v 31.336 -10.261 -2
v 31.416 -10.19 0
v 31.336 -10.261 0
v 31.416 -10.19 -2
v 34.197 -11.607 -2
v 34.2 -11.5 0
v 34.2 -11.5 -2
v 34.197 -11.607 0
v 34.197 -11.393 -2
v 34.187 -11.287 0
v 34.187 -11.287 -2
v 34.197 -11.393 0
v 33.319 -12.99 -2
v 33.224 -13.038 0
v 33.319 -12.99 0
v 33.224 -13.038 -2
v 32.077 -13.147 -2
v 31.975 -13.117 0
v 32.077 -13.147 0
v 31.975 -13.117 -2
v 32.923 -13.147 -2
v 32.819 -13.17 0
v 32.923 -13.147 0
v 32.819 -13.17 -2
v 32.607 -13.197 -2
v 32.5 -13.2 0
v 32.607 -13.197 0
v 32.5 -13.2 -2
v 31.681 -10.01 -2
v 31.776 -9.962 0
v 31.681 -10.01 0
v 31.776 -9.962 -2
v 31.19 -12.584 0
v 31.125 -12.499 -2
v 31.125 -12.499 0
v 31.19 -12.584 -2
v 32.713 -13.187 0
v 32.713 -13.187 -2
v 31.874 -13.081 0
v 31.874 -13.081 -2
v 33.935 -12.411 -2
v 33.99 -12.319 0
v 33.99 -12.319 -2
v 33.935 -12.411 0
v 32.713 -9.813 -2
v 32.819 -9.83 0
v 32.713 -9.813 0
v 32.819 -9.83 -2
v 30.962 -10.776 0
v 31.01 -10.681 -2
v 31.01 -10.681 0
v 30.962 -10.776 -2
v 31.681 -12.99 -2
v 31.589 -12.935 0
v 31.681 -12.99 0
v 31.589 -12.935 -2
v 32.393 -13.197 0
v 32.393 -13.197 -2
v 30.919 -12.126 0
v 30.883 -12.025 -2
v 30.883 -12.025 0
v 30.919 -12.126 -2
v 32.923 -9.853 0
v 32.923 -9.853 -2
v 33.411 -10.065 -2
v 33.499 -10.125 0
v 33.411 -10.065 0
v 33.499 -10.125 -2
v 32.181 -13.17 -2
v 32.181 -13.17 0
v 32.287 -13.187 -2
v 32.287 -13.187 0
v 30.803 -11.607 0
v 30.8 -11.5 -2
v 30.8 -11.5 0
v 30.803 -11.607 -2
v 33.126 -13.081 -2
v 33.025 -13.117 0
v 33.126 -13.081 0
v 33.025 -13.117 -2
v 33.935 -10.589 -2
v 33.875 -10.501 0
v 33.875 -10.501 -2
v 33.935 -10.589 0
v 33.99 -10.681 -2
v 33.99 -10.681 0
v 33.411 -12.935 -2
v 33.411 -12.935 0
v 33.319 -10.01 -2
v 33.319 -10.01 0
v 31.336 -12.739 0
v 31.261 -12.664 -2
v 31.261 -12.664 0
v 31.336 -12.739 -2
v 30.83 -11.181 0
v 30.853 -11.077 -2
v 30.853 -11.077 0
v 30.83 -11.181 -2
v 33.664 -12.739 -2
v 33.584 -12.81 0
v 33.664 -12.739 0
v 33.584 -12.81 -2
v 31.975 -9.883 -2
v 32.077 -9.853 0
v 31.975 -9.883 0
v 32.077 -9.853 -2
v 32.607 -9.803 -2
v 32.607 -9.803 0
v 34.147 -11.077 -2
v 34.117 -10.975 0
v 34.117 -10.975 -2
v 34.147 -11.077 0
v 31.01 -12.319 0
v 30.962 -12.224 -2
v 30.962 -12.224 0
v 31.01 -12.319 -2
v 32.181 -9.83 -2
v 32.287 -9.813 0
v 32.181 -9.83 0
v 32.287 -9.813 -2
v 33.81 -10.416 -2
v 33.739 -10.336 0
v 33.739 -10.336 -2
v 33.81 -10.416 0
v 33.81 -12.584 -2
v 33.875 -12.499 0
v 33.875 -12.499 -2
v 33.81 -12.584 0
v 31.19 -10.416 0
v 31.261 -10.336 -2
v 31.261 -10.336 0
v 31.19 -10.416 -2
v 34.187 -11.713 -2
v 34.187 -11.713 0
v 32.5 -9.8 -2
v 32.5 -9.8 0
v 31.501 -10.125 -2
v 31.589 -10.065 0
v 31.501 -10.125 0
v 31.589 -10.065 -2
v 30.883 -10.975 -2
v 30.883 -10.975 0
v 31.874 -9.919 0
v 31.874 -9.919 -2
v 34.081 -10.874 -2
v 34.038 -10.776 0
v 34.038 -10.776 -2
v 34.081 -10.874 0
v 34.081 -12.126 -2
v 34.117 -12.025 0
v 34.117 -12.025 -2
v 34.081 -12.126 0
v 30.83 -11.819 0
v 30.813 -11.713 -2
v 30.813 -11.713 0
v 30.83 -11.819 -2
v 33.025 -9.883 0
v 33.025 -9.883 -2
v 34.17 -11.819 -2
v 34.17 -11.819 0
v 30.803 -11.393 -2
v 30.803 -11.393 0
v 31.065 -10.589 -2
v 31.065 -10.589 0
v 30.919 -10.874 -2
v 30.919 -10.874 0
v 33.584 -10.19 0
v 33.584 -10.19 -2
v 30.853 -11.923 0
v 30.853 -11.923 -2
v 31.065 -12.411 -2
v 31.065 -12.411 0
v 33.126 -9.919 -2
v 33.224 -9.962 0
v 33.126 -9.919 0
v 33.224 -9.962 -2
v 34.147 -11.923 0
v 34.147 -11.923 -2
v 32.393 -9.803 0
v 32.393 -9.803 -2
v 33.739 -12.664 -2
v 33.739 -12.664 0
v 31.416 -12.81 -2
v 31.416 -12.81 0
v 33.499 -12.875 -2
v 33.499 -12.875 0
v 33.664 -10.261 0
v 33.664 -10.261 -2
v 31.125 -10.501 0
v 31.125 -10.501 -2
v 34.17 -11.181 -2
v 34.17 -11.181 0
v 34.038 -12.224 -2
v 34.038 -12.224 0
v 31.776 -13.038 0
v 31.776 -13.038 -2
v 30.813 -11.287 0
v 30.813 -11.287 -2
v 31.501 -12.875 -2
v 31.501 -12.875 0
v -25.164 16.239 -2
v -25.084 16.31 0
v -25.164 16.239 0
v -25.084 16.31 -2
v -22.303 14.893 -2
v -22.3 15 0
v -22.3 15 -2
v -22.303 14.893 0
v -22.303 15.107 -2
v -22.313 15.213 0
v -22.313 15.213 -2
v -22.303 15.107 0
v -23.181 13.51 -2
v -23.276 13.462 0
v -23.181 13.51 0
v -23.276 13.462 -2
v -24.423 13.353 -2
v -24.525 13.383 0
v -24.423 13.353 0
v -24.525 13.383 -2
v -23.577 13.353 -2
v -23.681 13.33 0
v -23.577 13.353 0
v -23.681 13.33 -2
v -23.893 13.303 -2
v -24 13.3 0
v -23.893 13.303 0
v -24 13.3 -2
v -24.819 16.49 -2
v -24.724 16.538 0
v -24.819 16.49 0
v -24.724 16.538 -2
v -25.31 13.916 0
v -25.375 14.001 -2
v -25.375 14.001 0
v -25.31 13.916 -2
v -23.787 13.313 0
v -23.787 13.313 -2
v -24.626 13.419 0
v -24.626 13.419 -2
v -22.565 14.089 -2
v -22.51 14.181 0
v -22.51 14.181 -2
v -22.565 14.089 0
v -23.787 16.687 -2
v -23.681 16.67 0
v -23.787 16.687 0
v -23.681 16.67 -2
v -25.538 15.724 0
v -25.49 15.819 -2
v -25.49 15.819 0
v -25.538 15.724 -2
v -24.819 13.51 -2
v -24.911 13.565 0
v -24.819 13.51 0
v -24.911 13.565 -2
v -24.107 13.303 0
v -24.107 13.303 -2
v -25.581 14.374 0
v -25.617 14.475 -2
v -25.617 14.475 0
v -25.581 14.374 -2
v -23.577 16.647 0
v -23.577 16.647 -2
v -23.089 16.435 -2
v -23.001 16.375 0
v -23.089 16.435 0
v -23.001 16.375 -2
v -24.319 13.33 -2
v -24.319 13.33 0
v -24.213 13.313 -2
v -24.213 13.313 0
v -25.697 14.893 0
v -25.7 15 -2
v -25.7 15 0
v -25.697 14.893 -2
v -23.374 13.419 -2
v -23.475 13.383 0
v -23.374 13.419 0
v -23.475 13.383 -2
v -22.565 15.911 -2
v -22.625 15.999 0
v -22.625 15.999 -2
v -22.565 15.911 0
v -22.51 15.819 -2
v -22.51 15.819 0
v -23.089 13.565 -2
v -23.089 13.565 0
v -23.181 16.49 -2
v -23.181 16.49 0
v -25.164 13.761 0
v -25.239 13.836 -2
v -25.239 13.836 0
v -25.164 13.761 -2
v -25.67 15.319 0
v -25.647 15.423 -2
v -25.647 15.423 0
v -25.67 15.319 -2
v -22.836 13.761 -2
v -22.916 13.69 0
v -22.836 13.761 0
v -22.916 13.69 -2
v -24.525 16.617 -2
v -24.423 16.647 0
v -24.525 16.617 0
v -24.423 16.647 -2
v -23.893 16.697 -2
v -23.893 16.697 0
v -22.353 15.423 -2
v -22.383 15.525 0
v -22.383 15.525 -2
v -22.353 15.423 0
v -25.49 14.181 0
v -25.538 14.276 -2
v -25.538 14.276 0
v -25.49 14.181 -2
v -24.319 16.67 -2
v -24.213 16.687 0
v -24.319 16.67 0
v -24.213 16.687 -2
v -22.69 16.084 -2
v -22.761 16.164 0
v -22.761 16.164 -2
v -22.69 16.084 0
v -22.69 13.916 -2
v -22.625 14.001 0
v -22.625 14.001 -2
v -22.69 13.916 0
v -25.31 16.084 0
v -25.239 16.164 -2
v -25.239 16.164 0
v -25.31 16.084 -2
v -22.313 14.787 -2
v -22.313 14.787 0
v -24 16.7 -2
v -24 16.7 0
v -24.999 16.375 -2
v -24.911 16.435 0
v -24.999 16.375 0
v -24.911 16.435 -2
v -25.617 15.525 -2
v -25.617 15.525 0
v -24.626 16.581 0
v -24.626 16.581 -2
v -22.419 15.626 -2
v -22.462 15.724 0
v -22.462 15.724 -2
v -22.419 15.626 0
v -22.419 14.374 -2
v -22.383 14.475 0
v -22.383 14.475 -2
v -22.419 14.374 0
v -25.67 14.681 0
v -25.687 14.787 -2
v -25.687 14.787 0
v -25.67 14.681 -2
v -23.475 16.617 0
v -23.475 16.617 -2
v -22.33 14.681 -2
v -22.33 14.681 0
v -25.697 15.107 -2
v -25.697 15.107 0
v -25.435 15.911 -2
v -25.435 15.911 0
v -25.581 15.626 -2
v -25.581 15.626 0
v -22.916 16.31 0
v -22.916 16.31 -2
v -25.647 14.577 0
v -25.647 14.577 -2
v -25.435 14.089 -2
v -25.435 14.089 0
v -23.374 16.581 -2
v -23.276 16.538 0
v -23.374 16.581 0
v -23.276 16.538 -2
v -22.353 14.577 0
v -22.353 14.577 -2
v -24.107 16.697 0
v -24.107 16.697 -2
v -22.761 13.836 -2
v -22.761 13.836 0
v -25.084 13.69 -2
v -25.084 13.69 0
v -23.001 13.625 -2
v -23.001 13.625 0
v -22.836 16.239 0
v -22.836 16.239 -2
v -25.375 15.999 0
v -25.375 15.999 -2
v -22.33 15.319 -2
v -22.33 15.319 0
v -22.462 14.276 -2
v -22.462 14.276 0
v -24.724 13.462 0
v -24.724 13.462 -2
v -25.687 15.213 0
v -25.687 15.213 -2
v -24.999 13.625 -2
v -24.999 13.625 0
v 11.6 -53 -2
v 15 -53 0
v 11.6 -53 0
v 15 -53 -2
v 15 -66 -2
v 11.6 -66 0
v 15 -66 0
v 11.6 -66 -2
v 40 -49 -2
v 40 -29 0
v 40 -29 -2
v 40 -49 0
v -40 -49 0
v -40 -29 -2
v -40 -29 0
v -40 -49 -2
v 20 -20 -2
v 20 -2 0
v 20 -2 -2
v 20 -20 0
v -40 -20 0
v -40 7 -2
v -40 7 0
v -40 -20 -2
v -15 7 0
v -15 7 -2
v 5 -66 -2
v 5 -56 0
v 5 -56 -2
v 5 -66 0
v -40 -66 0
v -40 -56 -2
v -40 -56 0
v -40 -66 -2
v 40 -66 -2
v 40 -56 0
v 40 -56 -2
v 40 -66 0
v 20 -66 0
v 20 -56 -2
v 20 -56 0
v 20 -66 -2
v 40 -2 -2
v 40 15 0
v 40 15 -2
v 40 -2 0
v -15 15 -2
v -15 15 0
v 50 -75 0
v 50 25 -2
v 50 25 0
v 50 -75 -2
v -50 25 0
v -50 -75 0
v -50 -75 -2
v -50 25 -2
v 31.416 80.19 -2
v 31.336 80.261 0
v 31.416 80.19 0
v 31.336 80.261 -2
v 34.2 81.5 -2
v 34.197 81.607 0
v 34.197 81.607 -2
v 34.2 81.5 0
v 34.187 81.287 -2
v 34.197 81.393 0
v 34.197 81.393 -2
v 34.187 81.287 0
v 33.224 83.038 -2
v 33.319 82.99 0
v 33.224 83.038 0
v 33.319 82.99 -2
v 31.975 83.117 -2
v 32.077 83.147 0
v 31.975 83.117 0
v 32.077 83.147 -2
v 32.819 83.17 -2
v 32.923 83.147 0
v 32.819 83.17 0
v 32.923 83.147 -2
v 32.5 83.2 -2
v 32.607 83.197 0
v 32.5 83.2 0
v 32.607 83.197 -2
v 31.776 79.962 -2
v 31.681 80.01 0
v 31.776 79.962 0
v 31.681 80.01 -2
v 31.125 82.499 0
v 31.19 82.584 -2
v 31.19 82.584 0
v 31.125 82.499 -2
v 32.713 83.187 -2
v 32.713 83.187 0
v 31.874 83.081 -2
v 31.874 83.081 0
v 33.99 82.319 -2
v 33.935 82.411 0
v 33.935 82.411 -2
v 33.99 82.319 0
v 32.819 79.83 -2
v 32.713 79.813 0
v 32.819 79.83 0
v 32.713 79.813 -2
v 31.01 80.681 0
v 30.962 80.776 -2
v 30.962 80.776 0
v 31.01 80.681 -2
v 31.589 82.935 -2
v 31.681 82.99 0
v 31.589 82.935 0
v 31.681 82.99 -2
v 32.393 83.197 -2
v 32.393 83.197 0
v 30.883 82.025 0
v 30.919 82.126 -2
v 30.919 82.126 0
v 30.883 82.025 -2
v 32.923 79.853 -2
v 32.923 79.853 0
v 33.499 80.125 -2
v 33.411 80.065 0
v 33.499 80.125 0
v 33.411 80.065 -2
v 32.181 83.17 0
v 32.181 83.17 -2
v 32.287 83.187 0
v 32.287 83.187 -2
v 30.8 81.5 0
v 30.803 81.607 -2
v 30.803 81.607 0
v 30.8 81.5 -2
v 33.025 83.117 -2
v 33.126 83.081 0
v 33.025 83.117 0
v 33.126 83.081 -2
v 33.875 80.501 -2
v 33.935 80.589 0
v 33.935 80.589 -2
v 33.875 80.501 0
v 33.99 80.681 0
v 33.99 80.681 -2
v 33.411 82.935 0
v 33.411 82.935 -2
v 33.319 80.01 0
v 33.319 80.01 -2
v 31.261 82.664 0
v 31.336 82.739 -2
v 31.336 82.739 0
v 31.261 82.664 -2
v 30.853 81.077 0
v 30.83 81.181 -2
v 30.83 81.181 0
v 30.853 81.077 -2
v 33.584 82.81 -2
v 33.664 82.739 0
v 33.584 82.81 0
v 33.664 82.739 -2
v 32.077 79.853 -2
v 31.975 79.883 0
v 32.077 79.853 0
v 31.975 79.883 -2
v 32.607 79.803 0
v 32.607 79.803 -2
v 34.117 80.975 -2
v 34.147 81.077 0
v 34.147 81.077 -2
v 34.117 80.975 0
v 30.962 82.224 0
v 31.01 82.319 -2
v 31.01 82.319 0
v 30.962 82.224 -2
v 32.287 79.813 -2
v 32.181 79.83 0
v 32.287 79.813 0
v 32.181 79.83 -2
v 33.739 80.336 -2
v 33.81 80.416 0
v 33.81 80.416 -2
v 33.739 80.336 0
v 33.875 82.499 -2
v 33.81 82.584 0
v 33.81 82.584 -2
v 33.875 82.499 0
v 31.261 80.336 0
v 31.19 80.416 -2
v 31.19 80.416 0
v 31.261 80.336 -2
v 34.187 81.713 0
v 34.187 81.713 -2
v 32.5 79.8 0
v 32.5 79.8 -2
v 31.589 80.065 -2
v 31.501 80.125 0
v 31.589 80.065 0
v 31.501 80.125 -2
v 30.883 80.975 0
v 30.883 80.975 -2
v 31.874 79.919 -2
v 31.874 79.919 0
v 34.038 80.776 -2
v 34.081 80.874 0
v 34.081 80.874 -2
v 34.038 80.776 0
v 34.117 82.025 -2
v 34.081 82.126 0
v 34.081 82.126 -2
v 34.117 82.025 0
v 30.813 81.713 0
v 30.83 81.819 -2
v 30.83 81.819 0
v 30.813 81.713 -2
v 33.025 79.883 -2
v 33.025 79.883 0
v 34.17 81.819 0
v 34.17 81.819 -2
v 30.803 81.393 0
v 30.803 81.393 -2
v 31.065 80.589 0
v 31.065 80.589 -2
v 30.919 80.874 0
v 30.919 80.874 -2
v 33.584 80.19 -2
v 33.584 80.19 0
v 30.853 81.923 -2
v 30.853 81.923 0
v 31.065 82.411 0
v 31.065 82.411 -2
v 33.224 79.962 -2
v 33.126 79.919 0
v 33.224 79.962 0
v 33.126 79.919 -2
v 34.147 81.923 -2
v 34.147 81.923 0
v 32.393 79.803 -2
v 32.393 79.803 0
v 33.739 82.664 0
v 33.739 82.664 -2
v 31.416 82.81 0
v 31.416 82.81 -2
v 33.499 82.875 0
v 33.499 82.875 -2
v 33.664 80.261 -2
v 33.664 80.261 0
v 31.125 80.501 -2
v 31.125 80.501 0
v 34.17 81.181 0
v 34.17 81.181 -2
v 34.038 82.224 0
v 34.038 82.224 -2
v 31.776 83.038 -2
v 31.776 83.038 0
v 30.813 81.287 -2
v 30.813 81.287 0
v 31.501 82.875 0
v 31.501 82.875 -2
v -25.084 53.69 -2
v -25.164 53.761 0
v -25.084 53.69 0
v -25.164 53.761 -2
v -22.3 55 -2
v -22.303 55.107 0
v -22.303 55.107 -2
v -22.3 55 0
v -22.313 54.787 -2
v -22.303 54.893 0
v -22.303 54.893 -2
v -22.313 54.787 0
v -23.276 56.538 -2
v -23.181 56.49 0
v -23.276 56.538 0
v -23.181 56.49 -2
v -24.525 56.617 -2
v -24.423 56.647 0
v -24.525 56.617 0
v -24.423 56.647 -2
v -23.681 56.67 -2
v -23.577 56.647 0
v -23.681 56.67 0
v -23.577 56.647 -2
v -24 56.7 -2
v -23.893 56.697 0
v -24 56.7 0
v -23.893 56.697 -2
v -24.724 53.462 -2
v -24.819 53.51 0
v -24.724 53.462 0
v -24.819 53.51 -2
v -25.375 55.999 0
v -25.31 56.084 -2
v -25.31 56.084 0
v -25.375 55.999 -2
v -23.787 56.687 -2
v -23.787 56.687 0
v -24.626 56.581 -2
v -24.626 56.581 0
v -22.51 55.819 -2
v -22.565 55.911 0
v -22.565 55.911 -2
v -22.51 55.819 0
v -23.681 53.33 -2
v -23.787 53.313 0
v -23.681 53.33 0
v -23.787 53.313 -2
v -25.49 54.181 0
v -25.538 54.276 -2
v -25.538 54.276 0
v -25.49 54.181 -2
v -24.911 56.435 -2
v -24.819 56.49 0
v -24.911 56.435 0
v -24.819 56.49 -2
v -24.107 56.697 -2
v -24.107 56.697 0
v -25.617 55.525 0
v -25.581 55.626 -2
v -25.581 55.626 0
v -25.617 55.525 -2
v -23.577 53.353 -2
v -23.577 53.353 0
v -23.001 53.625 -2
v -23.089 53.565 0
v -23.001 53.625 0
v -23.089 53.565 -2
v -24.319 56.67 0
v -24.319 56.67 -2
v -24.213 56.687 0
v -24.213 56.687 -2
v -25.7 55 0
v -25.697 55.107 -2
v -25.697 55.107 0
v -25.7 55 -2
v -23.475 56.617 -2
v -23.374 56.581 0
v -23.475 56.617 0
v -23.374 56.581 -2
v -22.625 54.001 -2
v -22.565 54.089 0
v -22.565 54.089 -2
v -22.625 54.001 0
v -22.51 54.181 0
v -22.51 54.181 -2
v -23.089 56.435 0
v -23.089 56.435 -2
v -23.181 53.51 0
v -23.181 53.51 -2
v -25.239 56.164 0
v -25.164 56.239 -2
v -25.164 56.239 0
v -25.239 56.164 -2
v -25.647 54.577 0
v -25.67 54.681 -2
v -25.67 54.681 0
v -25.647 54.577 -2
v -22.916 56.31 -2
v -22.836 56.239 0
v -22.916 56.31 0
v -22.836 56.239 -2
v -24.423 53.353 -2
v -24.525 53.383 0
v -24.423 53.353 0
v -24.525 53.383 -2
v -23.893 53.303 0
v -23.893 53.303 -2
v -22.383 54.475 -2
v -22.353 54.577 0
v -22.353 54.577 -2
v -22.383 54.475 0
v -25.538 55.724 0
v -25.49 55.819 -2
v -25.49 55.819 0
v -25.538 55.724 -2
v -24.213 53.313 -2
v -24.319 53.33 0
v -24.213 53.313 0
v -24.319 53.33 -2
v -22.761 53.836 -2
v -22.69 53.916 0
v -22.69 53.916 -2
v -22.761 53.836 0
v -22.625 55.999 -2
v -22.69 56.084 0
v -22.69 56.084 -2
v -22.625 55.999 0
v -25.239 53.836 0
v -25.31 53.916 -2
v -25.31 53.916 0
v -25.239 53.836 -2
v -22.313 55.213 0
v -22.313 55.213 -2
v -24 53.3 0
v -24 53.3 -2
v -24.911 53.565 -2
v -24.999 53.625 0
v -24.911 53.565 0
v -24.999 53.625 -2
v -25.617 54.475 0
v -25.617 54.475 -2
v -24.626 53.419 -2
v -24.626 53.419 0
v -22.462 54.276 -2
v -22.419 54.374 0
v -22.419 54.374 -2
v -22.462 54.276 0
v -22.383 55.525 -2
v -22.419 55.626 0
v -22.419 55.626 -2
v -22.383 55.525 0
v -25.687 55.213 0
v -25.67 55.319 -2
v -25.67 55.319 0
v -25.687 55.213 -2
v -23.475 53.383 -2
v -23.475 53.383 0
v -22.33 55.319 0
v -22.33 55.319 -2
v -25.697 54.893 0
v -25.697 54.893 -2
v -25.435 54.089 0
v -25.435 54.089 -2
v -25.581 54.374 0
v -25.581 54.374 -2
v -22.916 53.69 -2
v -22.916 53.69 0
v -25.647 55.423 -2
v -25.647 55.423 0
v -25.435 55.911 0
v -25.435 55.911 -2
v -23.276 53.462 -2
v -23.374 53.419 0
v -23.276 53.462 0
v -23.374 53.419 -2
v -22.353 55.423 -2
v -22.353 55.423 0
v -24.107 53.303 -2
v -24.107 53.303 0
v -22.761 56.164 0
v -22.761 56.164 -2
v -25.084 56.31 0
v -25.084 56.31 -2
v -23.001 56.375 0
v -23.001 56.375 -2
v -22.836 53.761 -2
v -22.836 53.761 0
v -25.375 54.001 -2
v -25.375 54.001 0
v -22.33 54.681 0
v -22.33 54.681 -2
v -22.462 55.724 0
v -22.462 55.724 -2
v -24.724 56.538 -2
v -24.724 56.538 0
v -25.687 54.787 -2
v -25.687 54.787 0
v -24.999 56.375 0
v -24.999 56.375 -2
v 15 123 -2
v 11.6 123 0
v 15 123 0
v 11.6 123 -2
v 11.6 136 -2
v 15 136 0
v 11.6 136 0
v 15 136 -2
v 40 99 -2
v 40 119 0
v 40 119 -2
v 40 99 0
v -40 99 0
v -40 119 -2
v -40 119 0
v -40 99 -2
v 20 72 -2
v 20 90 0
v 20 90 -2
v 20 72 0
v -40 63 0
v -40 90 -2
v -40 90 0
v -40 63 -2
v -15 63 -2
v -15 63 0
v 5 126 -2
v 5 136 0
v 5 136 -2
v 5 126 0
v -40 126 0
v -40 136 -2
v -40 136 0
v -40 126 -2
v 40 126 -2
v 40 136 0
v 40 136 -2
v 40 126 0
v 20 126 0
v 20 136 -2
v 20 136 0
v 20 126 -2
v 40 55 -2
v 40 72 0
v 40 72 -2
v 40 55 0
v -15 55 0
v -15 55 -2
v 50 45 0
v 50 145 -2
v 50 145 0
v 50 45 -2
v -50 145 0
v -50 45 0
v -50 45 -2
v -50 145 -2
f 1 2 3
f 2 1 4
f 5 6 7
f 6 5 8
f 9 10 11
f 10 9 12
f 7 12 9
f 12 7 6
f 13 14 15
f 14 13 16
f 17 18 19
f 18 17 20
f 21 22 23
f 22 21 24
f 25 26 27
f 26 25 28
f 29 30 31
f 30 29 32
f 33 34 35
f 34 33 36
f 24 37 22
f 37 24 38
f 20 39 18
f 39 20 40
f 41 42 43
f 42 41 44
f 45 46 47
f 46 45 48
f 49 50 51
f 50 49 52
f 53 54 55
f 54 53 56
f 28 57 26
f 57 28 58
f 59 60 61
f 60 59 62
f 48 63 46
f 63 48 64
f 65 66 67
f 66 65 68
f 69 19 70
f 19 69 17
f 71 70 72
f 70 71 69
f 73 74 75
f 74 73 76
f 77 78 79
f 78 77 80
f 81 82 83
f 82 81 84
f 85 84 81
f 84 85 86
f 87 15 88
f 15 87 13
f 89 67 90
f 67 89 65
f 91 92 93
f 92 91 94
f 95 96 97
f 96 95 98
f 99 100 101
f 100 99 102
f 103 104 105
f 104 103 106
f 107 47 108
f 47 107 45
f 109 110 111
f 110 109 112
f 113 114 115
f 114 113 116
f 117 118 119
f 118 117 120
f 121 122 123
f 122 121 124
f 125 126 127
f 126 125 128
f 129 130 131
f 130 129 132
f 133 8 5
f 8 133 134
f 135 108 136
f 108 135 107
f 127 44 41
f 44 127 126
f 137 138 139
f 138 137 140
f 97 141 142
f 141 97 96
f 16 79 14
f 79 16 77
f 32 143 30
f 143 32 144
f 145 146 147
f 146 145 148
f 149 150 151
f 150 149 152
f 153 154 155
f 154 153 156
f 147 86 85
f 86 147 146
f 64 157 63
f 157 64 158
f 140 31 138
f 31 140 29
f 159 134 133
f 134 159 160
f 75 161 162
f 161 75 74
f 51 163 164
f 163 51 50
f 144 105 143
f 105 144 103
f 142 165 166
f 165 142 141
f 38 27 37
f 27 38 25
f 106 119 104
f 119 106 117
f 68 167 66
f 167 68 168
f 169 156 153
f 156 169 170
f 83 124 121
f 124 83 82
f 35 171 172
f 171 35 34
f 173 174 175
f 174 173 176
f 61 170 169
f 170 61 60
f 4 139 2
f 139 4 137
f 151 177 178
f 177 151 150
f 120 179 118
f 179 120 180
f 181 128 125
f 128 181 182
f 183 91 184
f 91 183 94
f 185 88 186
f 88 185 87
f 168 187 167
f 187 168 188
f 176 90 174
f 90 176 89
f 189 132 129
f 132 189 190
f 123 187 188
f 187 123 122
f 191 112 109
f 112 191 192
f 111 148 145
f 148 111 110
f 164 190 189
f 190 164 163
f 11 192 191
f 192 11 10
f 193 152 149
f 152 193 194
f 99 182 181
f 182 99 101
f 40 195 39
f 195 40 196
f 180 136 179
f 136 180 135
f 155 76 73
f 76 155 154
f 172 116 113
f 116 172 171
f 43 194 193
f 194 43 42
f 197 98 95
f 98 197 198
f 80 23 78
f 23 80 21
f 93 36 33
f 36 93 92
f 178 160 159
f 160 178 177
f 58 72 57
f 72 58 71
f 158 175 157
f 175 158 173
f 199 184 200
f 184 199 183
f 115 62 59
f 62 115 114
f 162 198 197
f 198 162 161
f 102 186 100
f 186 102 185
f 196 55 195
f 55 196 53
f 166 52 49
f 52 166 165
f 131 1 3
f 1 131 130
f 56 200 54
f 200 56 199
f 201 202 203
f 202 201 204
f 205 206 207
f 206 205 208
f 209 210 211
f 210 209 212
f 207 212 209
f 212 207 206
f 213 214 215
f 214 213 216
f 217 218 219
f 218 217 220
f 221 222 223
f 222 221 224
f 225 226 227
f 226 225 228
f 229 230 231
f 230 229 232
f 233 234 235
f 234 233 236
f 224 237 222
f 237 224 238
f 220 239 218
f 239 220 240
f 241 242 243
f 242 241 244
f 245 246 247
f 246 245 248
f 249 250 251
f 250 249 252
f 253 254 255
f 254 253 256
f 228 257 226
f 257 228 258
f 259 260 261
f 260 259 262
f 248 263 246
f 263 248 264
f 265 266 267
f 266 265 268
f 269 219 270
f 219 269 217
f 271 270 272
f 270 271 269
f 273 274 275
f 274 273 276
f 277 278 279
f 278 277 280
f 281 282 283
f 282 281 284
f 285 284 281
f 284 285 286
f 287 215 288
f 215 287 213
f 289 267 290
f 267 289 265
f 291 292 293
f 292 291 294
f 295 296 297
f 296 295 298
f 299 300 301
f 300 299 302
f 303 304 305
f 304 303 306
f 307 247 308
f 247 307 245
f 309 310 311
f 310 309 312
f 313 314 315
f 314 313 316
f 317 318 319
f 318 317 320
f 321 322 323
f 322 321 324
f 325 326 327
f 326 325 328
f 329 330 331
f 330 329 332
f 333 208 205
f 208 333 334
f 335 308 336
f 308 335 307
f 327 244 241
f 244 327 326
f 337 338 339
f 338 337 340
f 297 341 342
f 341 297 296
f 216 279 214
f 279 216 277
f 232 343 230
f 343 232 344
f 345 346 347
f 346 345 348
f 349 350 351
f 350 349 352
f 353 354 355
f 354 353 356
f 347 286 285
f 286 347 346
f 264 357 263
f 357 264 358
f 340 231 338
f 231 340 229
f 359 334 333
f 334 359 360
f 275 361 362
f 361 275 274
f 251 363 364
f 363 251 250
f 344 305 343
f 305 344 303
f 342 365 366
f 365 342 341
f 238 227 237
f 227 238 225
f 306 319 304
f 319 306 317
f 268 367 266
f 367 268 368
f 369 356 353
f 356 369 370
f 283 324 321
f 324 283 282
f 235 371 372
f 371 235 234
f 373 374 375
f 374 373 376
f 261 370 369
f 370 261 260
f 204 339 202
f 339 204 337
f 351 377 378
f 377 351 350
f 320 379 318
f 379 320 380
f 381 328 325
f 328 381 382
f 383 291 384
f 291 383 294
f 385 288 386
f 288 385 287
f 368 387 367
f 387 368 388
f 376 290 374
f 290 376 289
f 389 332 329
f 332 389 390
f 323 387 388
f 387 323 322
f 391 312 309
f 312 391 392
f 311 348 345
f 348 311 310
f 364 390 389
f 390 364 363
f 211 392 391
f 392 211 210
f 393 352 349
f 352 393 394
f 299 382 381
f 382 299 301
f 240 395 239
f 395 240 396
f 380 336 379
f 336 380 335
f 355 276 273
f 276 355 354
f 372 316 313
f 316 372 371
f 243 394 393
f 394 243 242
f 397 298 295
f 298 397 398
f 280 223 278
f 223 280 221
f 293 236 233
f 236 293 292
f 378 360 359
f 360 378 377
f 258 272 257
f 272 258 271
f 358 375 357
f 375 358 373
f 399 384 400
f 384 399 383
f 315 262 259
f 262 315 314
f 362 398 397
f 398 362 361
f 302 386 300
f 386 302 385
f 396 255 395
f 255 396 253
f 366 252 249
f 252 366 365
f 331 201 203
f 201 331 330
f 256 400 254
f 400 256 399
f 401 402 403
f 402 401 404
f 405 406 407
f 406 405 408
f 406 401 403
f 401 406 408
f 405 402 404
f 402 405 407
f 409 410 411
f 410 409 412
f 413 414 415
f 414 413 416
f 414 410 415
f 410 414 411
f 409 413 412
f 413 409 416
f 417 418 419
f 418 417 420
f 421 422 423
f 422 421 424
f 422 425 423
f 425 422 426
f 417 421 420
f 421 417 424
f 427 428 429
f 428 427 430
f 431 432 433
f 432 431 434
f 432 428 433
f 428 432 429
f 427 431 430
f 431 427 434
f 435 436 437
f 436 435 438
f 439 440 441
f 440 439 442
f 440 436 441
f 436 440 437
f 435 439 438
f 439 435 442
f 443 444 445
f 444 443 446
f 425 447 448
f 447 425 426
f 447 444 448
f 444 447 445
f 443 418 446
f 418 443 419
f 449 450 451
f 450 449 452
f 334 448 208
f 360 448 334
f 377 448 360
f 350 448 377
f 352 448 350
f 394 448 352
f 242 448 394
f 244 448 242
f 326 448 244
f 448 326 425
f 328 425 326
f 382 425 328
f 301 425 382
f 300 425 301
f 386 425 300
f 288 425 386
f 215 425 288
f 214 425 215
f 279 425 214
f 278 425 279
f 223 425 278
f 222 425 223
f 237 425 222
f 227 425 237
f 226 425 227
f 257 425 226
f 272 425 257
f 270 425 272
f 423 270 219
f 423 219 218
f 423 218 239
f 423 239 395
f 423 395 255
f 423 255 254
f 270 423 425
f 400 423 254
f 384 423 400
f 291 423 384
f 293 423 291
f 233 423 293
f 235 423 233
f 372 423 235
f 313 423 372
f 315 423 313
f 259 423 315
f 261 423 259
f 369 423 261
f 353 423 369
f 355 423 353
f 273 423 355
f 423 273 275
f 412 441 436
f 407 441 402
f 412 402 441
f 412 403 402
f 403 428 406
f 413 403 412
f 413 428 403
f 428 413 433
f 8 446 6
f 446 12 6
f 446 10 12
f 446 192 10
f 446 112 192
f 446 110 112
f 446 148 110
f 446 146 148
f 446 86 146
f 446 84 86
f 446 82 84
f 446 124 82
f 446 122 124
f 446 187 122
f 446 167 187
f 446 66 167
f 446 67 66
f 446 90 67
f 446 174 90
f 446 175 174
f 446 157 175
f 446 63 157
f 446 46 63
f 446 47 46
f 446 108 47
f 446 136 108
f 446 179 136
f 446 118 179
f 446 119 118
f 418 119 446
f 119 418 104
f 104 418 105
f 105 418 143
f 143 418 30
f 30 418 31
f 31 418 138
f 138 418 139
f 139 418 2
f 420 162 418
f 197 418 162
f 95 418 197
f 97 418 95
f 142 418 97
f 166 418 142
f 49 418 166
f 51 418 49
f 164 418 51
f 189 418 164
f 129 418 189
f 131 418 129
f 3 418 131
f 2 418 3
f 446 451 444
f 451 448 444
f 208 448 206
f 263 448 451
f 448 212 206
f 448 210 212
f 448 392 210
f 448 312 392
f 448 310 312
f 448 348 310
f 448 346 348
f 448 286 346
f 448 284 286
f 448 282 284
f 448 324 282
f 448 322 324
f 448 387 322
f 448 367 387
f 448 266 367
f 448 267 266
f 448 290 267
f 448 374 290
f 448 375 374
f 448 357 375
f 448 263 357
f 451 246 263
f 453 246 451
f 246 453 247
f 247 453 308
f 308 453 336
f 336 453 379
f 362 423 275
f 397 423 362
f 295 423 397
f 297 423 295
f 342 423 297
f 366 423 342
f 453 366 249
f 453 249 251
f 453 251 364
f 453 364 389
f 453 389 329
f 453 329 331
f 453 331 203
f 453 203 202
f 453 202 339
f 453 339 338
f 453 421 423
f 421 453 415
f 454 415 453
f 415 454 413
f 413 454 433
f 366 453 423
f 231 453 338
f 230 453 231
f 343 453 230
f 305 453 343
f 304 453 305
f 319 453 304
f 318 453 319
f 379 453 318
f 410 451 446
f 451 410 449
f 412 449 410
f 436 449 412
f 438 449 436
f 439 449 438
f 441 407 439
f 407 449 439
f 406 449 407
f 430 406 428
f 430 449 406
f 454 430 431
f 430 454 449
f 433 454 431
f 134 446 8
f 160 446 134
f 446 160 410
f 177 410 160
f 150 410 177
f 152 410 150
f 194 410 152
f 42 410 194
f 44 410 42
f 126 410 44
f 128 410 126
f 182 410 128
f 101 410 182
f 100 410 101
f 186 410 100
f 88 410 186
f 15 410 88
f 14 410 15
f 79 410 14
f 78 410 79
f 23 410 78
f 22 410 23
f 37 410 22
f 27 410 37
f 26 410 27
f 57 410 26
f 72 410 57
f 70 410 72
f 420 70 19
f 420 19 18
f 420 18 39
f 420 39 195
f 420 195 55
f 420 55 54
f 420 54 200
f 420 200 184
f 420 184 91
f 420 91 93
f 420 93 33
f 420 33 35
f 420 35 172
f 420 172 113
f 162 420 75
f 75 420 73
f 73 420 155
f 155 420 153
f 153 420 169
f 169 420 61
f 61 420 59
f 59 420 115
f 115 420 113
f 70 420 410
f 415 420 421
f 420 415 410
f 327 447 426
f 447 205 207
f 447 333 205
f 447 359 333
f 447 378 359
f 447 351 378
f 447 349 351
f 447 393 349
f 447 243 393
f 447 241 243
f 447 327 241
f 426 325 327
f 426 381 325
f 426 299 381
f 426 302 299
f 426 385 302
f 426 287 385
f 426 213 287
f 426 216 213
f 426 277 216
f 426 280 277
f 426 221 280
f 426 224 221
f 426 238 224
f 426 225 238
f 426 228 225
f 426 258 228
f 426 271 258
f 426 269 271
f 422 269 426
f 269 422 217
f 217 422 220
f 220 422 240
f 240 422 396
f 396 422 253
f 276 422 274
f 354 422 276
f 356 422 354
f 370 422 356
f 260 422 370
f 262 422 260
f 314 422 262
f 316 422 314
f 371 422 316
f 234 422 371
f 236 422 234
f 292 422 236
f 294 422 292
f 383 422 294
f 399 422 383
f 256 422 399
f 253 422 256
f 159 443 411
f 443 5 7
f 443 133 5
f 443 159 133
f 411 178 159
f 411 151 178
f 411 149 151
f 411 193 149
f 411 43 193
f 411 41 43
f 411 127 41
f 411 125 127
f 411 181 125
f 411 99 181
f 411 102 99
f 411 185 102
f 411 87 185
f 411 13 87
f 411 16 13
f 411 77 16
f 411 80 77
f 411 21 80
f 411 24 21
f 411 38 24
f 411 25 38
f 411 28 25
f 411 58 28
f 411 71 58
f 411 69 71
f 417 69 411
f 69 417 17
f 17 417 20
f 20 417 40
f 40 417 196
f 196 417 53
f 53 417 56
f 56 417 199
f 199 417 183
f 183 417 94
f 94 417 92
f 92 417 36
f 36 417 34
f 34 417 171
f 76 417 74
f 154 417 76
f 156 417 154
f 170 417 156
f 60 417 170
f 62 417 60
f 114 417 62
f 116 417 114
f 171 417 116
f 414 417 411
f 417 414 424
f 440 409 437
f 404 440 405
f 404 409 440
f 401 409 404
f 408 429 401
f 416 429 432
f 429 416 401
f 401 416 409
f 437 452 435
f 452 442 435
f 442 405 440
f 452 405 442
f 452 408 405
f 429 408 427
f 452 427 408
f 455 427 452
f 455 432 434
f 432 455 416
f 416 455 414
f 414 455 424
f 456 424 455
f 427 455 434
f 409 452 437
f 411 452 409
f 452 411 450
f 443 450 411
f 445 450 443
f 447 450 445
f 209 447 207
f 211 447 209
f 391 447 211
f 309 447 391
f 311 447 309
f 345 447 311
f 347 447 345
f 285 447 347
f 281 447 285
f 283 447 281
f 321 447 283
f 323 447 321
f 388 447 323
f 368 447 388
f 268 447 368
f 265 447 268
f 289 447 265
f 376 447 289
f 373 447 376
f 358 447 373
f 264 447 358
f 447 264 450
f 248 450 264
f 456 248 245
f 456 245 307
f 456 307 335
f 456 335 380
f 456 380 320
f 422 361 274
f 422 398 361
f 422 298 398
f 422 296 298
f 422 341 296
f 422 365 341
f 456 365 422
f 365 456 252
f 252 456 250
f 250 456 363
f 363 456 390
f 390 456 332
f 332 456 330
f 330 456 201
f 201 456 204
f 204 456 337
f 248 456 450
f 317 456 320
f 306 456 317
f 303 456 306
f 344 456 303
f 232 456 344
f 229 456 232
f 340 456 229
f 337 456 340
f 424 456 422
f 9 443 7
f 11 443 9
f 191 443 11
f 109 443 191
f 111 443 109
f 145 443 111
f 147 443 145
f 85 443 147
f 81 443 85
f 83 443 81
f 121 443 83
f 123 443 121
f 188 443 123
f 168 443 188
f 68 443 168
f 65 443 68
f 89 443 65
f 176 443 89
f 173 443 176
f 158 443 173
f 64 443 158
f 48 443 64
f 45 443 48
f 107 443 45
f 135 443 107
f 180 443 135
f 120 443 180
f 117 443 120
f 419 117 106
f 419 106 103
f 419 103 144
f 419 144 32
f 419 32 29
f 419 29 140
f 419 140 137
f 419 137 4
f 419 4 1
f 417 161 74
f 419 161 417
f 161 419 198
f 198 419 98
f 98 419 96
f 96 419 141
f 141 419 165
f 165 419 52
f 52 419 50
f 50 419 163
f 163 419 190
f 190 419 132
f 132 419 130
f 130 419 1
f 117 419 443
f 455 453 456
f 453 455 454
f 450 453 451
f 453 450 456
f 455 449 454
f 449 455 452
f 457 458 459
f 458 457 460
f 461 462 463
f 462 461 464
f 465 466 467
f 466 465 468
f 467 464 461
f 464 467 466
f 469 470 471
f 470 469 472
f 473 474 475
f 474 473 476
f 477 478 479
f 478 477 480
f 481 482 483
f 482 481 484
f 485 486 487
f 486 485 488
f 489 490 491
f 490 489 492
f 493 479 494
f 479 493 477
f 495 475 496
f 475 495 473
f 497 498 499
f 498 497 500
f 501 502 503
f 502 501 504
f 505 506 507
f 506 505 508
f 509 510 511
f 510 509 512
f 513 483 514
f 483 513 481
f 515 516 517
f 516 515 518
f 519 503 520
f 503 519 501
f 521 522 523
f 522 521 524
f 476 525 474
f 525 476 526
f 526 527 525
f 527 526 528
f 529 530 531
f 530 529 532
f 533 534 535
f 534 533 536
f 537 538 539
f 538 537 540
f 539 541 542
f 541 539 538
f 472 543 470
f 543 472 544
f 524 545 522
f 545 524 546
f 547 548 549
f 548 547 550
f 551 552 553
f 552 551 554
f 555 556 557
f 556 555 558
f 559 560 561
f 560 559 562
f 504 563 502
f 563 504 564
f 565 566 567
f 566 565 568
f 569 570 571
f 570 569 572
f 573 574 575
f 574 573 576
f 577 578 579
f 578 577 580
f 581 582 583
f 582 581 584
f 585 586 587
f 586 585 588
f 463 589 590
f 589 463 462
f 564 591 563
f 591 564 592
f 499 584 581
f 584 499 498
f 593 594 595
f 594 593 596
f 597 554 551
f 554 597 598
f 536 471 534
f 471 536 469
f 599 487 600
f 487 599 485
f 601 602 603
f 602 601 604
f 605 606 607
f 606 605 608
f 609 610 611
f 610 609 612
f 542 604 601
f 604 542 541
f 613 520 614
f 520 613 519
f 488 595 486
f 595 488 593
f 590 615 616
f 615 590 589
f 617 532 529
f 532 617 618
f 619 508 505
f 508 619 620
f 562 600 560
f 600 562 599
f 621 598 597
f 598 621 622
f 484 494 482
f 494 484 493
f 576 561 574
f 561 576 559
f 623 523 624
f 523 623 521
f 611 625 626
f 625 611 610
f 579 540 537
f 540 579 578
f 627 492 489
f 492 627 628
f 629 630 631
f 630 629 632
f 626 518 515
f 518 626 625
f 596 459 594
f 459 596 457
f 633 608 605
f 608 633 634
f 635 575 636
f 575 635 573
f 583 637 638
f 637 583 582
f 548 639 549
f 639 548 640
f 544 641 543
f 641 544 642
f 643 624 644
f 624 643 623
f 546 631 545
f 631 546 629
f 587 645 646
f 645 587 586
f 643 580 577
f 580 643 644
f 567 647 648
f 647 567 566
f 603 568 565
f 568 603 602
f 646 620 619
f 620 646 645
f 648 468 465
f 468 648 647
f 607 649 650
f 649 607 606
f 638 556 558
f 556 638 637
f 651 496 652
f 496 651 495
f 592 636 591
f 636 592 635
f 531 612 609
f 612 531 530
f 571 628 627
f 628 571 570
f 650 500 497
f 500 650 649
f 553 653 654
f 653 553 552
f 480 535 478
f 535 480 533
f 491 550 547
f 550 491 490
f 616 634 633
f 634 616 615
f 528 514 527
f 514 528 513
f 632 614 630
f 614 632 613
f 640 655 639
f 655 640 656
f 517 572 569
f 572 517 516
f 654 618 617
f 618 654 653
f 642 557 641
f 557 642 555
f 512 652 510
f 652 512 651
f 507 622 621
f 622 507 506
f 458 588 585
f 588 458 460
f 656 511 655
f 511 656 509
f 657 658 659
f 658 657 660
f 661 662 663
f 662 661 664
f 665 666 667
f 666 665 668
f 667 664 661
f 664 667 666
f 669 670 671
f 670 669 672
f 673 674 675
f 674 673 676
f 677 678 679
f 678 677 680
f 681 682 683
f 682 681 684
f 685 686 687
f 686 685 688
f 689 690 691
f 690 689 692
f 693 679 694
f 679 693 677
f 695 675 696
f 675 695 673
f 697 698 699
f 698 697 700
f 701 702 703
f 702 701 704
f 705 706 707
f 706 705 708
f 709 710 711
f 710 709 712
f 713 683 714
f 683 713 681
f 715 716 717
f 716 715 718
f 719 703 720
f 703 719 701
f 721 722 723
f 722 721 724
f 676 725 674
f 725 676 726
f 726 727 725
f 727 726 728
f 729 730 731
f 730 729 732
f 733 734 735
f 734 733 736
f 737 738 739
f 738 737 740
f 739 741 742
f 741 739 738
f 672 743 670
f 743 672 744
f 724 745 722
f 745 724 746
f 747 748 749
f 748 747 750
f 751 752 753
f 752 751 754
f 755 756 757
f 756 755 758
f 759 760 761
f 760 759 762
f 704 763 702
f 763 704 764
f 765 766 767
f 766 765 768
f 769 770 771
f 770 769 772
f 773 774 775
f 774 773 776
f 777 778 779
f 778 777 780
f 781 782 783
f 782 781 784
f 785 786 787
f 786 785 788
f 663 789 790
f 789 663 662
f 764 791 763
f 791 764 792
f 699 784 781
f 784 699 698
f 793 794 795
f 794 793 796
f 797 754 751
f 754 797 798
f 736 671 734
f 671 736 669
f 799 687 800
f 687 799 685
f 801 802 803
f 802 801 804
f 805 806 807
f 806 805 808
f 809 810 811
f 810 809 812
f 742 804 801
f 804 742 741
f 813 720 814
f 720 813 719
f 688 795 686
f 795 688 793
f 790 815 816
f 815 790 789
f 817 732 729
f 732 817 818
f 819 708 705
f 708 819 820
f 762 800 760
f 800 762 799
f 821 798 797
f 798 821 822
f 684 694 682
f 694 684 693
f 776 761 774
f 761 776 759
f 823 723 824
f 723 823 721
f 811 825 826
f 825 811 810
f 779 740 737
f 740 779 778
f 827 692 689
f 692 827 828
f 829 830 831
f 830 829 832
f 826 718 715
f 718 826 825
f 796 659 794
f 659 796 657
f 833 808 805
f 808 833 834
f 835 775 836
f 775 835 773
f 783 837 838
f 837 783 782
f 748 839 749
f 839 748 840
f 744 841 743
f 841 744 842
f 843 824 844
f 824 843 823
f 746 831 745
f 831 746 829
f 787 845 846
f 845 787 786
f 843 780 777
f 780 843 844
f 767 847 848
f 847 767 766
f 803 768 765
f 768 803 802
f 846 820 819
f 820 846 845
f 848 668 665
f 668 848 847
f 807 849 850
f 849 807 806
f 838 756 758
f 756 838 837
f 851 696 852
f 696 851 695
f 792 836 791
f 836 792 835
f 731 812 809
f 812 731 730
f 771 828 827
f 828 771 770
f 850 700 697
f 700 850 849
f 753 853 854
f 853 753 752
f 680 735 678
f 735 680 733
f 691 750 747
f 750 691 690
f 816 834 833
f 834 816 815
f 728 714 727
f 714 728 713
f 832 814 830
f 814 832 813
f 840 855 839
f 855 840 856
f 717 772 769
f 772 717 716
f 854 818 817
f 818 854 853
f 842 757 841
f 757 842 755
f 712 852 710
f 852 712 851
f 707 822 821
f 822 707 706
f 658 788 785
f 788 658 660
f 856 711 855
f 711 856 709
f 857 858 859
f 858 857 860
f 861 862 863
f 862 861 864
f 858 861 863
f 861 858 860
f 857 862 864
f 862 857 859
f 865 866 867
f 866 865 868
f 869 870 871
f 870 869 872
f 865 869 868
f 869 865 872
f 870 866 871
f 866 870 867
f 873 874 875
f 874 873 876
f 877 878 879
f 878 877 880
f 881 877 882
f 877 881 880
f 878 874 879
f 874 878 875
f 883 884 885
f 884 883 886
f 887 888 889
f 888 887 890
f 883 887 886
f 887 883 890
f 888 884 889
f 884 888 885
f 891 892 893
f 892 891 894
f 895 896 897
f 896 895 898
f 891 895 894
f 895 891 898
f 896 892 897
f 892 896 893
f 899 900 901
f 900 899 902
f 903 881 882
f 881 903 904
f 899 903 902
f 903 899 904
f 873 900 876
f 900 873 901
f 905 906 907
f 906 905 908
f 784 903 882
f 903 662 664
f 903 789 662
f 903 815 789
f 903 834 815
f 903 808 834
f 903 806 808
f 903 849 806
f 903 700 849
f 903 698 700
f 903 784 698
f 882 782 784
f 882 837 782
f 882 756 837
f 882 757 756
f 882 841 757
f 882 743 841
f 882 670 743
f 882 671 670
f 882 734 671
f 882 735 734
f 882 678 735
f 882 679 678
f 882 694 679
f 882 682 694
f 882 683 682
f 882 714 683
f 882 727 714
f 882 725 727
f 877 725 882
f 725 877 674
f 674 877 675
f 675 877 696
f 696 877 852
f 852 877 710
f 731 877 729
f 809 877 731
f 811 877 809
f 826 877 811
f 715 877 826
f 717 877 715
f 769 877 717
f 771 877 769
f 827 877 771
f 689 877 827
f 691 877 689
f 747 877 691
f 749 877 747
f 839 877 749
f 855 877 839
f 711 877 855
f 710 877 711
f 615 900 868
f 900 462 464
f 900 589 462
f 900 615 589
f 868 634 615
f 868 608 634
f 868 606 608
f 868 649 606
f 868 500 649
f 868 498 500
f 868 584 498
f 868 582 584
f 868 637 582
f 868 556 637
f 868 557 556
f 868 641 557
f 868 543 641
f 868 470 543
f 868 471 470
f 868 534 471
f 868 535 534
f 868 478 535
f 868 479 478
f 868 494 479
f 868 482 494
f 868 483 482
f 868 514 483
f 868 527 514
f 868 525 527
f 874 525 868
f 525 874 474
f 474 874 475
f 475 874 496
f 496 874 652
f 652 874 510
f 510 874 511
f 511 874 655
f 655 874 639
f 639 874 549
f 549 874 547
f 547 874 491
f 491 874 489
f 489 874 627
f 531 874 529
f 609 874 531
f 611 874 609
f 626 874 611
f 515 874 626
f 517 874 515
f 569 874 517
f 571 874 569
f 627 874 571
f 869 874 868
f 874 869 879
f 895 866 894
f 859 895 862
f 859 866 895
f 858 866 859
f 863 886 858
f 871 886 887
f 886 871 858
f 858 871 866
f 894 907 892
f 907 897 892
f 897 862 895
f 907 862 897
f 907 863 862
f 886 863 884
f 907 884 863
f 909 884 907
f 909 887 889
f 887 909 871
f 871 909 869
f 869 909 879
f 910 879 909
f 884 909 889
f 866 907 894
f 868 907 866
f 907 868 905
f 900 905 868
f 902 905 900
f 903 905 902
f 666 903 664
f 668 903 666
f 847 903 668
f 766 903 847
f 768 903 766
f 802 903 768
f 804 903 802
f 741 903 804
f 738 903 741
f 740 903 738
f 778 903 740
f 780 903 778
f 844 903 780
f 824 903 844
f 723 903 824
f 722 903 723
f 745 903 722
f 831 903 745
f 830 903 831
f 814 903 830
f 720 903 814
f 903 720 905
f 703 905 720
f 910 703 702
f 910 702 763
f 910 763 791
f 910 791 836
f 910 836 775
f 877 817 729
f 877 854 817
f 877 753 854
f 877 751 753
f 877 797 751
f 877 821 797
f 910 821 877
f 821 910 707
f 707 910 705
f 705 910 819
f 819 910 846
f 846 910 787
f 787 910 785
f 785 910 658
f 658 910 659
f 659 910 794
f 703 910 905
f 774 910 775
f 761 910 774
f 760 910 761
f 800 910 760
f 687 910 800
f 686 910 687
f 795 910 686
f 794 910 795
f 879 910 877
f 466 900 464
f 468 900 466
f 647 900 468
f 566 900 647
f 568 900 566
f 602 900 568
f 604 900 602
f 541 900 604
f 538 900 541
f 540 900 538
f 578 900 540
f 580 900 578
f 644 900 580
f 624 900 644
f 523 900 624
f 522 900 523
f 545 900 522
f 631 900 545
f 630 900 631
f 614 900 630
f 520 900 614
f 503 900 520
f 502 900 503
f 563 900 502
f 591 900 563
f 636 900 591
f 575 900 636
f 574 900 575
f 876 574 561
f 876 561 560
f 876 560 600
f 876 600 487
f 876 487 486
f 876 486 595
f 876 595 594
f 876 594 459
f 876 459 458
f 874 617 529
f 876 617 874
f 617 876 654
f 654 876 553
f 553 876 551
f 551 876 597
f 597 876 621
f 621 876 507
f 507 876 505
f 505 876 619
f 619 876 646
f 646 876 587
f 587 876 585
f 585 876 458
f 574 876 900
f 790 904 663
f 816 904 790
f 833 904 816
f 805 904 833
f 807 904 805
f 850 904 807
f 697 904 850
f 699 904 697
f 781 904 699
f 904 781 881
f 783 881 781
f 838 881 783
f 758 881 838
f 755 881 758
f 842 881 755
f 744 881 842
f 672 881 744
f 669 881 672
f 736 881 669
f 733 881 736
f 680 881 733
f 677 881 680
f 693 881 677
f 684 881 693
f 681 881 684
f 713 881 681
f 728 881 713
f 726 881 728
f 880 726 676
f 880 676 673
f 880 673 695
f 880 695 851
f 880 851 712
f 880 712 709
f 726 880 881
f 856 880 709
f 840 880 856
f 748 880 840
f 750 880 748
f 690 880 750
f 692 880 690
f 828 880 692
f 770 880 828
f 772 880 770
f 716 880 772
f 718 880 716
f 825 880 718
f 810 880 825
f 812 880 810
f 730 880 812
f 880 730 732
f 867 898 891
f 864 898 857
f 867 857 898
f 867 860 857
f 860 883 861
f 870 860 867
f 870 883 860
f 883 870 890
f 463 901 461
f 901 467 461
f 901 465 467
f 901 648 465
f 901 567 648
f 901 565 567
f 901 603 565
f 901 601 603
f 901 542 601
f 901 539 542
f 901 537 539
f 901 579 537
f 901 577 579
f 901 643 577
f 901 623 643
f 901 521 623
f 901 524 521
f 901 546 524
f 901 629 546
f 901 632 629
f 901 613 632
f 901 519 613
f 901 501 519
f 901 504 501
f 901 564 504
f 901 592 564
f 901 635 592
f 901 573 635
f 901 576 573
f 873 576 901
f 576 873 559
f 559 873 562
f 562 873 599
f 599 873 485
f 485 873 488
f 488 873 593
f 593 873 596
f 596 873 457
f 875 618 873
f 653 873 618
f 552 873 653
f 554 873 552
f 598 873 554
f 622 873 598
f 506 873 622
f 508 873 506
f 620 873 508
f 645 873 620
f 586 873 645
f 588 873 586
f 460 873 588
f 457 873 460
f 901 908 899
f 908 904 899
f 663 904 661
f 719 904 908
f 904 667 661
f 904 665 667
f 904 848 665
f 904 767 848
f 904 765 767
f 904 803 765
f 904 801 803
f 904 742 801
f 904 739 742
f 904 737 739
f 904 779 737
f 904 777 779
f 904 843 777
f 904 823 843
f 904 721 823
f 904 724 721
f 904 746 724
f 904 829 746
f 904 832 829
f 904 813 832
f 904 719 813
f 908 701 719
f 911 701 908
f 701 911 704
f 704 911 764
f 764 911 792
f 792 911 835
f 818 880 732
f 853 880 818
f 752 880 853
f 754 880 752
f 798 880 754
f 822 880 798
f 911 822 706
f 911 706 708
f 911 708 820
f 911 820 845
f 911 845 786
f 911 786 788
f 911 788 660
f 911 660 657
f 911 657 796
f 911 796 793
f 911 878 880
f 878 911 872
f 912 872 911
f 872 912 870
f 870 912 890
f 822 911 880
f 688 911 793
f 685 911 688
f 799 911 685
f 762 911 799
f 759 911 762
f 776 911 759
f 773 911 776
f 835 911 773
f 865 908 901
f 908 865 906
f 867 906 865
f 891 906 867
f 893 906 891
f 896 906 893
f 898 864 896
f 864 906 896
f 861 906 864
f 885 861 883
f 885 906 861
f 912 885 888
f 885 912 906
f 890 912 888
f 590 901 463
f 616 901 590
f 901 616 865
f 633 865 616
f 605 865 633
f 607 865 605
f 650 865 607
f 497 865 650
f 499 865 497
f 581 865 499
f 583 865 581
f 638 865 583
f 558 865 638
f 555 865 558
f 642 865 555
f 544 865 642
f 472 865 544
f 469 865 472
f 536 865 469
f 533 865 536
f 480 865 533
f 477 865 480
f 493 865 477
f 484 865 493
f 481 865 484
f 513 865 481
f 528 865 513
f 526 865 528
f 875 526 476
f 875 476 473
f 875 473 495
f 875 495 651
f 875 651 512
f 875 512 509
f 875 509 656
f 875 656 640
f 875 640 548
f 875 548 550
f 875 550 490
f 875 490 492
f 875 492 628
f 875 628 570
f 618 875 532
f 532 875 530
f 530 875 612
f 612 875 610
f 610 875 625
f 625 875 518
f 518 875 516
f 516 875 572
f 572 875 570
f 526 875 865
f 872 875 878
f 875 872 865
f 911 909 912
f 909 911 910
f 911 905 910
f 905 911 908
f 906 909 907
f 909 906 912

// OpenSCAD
// file: ../transmission/gears/wheelGears.scad
use <MCAD/involute_gears.scad>

//*****************************************************
backlash = 0.25;
clearance = 0.2;

teeth_small = 12;   // number of teeth on small gear
teeth_big = 60;     // number of teeth on big gear
pressure = 20;      // pressure angle
pitch = 1.5;        // diametral pitch of all gears
$fn=100;             // enable smoth cylinders
//*****************************************************
    
//shaft();
//reduction();
//wheel();
//box();

//bolt();
//nut();
//trapped_nut();
//bearing_clamp();
//motor_clamp();
//tab_wing();
assembly();
//boxAndWheel();

module boxAndWheel(){
    rotate([90,0,0])translate([0,23,34])cylinder(11,42,42);
    color("darkorange")
        rotate([90,0,0])translate([0,23,18])wheel();
    color("yellow")
        translate([-50,-26.5,0])box();
}

module assembly(){
    color("darkorange")
        rotate([90,0,0])translate([-24,1,-4])shaft();
    color("darkorange")
        rotate([90,0,0])reduction();
    color("darkorange")
        rotate([90,0,0])translate([-24,0,9])reduction();
    color("darkorange")
        rotate([90,0,0])translate([0,0,18])wheel();
    color("yellow")
        translate([-50,-26.5,-23])box();
}



module box(){
    union(){
        // reduction 1 nut
        rotate([90,0,0])translate([21.5,20,-1])trapped_nut();
        // reduction 2 nut
        rotate([90,0,180])translate([-54.5,20,29])trapped_nut();
        difference(){
            cube([76,30,26]);
            // hollow box cut
            translate([2,2,2])cube([72,26,26]);
            // shaft cut
            rotate([90,0,0])translate([26,24,-31])cylinder(4, 6, 6);
            // wheel cut
            rotate([90,0,0])translate([50,23,-3])
                cylinder(4, 12, 12);
            // reduction 1 cut
            rotate([90,0,0])translate([26,23,-3])
                cylinder(4, 1.5+clearance, 1.5+clearance);
            // reduction 2 cut
            rotate([90,0,0])translate([50,23,-31])
                cylinder(4, 1.5+clearance, 1.5+clearance);
            
        };
        rotate([90,0,0])translate([26,24,-45.5])motor_clamp();
        rotate([90,0,0])translate([50,23,-2])bearing_clamp();
        rotate([0,0,90])translate([15,-76,0])tab_wing();
    }
    
}


// Total height: 29mm
// Diameter: 41.6mm
module wheel(){
    gear_big(t=4, bd=3);
    difference(){
        translate([0,0,4])cylinder(30,3.95+clearance/2,3.95+clearance/2);
        translate([0,0,19])cylinder(16,1.75+clearance/2,1.75+clearance/2);
    }
}

// Total height: 14mm
// Diameter: 41.6mm
module reduction(){
    gear_big(t=4, bd=2.8+clearance);
    translate([0,0,4])gear_small(t=10, bd=2.8+clearance);
}

// Diameter: 9.6mm
module shaft(){
    gear_small(t=8, bd=2.0+clearance);
}


//*****************************************************
module gear_big(nt=teeth_big, dp=pitch, t=4, pa=pressure, bd=0){
    gear(number_of_teeth = nt,
		diametral_pitch = dp,
		gear_thickness = t,
		rim_thickness = t,
		hub_thickness = t,
		bore_diameter = bd,
        backlash = backlash,
		clearance = clearance,
		pressure_angle = pa);
}

module gear_small(nt=teeth_small, dp=pitch, t=4, pa=pressure, bd=0){
    gear(number_of_teeth = nt,
		diametral_pitch = dp,
		gear_thickness = t,
		rim_thickness = t,
		hub_thickness = t,
		bore_diameter = bd,
		backlash = backlash,
		clearance = clearance,
		pressure_angle = pa);
}
module bolt(){
    union(){
        cylinder(25, 1.5+clearance, 1.5+clearance);
        cylinder(3, 3.5, 3.5, $fn=6);
    }
}

module nut(){
    union(){
        cylinder(25, 1.5+clearance, 1.5+clearance);
        translate([-0.5,0,5])cylinder(3, 3.5, 3.5, $fn=6);
        translate([-2.2,-3.05,5])cube([10,6.1,3]);
    }
}
module trapped_nut(){
    difference(){
        union(){
            cube([9,6,8]);
            translate([4.5, 0, 0])cylinder(8, 4.5, 4.5);
        }
        rotate([0,0,90])translate([3,-4.5,-3])nut();
    }
}
module bearing_clamp(){
    union(){
        difference(){
            cylinder(8, 13.95, 13.95);
            translate([0,0,-0.5])cylinder(9, 10.92, 10.92);
            translate([-4,9,-0.5])cube([8,5,9]);
        }
        difference(){
            union(){
                translate([4,11,0])cube([3,9,8]);
                translate([-7,11,0])cube([3,9,8]);
            }
            rotate([0,90,0])translate([-4,16,-8.5])rotate([0,0,90])bolt();
        }
    }
}
module motor_clamp(){
    difference(){
        union(){
            // clamp
            difference(){
                cylinder(8, 15.5, 15.5);
                translate([0,0,-0.5])cylinder(9, 12.5, 12.5);
                translate([-4,11,-0.5])cube([8,5,9]);
            }
            // clamp wings
            difference(){
                union(){
                    translate([4,13,0])cube([3,9,8]);
                    translate([-7,13,0])cube([3,9,8]);
                }
                rotate([0,90,0])translate([-4,18,-8.5])
                    rotate([0,0,90])bolt();
            }
            // base
            translate([-8,-24,0])cube([16,6,16]);
            // base joint
            translate([-8,-19,0])cube([16,6,8]);
        };
        rotate([90,0,0])translate([0,4,11.8])bolt();
    }
    
}
module tab_wing(){
    difference(){
        rotate([0,0,22.5])cylinder(6,14,14,$fn=8);
        rotate([180,0,90])translate([-6.5,0,-6.5])bolt();
        translate([-16,1,-1])cube([32,20,8]);
    }
}
// main file
use <../transmission/gears/wheelGears.scad>

$fn = 100;
clearance = 0.2;


/*union(){
    rotate([0,0,90])translate([-70,-30,0])holder();
    boxAndWheel();
}*/

// Left frame
wheelFrame();
// Right frame
mirror([0,1,0])translate([0,-70,0])wheelFrame();

// Frame
module wheelFrame(){
    difference(){
        translate([-50,-75,-2])cube([100,100,2]);
        union(){
            translate([-40,-49,-5])cube([80,20,10]);
            translate([32.5,-11.5,-6])bolt();
            translate([-24,15,-6])bolt();
            rotate([0,0,90])translate([-66,-15,-6])adjustableBolt();
            
            translate([-40,-20,-5])cube([60,27,10]);
            translate([-40,-66,-5])cube([45,10,10]);
            translate([20,-66,-5])cube([20,10,10]);
            translate([-15,-2,-5])cube([55,17,10]);
        }
    }
}

module adjustableBolt(){
    union(){
        cube([13,3.2+clearance,25]);
        translate([-2,-1.3,0])cube([17,6,3]);
    }
}
